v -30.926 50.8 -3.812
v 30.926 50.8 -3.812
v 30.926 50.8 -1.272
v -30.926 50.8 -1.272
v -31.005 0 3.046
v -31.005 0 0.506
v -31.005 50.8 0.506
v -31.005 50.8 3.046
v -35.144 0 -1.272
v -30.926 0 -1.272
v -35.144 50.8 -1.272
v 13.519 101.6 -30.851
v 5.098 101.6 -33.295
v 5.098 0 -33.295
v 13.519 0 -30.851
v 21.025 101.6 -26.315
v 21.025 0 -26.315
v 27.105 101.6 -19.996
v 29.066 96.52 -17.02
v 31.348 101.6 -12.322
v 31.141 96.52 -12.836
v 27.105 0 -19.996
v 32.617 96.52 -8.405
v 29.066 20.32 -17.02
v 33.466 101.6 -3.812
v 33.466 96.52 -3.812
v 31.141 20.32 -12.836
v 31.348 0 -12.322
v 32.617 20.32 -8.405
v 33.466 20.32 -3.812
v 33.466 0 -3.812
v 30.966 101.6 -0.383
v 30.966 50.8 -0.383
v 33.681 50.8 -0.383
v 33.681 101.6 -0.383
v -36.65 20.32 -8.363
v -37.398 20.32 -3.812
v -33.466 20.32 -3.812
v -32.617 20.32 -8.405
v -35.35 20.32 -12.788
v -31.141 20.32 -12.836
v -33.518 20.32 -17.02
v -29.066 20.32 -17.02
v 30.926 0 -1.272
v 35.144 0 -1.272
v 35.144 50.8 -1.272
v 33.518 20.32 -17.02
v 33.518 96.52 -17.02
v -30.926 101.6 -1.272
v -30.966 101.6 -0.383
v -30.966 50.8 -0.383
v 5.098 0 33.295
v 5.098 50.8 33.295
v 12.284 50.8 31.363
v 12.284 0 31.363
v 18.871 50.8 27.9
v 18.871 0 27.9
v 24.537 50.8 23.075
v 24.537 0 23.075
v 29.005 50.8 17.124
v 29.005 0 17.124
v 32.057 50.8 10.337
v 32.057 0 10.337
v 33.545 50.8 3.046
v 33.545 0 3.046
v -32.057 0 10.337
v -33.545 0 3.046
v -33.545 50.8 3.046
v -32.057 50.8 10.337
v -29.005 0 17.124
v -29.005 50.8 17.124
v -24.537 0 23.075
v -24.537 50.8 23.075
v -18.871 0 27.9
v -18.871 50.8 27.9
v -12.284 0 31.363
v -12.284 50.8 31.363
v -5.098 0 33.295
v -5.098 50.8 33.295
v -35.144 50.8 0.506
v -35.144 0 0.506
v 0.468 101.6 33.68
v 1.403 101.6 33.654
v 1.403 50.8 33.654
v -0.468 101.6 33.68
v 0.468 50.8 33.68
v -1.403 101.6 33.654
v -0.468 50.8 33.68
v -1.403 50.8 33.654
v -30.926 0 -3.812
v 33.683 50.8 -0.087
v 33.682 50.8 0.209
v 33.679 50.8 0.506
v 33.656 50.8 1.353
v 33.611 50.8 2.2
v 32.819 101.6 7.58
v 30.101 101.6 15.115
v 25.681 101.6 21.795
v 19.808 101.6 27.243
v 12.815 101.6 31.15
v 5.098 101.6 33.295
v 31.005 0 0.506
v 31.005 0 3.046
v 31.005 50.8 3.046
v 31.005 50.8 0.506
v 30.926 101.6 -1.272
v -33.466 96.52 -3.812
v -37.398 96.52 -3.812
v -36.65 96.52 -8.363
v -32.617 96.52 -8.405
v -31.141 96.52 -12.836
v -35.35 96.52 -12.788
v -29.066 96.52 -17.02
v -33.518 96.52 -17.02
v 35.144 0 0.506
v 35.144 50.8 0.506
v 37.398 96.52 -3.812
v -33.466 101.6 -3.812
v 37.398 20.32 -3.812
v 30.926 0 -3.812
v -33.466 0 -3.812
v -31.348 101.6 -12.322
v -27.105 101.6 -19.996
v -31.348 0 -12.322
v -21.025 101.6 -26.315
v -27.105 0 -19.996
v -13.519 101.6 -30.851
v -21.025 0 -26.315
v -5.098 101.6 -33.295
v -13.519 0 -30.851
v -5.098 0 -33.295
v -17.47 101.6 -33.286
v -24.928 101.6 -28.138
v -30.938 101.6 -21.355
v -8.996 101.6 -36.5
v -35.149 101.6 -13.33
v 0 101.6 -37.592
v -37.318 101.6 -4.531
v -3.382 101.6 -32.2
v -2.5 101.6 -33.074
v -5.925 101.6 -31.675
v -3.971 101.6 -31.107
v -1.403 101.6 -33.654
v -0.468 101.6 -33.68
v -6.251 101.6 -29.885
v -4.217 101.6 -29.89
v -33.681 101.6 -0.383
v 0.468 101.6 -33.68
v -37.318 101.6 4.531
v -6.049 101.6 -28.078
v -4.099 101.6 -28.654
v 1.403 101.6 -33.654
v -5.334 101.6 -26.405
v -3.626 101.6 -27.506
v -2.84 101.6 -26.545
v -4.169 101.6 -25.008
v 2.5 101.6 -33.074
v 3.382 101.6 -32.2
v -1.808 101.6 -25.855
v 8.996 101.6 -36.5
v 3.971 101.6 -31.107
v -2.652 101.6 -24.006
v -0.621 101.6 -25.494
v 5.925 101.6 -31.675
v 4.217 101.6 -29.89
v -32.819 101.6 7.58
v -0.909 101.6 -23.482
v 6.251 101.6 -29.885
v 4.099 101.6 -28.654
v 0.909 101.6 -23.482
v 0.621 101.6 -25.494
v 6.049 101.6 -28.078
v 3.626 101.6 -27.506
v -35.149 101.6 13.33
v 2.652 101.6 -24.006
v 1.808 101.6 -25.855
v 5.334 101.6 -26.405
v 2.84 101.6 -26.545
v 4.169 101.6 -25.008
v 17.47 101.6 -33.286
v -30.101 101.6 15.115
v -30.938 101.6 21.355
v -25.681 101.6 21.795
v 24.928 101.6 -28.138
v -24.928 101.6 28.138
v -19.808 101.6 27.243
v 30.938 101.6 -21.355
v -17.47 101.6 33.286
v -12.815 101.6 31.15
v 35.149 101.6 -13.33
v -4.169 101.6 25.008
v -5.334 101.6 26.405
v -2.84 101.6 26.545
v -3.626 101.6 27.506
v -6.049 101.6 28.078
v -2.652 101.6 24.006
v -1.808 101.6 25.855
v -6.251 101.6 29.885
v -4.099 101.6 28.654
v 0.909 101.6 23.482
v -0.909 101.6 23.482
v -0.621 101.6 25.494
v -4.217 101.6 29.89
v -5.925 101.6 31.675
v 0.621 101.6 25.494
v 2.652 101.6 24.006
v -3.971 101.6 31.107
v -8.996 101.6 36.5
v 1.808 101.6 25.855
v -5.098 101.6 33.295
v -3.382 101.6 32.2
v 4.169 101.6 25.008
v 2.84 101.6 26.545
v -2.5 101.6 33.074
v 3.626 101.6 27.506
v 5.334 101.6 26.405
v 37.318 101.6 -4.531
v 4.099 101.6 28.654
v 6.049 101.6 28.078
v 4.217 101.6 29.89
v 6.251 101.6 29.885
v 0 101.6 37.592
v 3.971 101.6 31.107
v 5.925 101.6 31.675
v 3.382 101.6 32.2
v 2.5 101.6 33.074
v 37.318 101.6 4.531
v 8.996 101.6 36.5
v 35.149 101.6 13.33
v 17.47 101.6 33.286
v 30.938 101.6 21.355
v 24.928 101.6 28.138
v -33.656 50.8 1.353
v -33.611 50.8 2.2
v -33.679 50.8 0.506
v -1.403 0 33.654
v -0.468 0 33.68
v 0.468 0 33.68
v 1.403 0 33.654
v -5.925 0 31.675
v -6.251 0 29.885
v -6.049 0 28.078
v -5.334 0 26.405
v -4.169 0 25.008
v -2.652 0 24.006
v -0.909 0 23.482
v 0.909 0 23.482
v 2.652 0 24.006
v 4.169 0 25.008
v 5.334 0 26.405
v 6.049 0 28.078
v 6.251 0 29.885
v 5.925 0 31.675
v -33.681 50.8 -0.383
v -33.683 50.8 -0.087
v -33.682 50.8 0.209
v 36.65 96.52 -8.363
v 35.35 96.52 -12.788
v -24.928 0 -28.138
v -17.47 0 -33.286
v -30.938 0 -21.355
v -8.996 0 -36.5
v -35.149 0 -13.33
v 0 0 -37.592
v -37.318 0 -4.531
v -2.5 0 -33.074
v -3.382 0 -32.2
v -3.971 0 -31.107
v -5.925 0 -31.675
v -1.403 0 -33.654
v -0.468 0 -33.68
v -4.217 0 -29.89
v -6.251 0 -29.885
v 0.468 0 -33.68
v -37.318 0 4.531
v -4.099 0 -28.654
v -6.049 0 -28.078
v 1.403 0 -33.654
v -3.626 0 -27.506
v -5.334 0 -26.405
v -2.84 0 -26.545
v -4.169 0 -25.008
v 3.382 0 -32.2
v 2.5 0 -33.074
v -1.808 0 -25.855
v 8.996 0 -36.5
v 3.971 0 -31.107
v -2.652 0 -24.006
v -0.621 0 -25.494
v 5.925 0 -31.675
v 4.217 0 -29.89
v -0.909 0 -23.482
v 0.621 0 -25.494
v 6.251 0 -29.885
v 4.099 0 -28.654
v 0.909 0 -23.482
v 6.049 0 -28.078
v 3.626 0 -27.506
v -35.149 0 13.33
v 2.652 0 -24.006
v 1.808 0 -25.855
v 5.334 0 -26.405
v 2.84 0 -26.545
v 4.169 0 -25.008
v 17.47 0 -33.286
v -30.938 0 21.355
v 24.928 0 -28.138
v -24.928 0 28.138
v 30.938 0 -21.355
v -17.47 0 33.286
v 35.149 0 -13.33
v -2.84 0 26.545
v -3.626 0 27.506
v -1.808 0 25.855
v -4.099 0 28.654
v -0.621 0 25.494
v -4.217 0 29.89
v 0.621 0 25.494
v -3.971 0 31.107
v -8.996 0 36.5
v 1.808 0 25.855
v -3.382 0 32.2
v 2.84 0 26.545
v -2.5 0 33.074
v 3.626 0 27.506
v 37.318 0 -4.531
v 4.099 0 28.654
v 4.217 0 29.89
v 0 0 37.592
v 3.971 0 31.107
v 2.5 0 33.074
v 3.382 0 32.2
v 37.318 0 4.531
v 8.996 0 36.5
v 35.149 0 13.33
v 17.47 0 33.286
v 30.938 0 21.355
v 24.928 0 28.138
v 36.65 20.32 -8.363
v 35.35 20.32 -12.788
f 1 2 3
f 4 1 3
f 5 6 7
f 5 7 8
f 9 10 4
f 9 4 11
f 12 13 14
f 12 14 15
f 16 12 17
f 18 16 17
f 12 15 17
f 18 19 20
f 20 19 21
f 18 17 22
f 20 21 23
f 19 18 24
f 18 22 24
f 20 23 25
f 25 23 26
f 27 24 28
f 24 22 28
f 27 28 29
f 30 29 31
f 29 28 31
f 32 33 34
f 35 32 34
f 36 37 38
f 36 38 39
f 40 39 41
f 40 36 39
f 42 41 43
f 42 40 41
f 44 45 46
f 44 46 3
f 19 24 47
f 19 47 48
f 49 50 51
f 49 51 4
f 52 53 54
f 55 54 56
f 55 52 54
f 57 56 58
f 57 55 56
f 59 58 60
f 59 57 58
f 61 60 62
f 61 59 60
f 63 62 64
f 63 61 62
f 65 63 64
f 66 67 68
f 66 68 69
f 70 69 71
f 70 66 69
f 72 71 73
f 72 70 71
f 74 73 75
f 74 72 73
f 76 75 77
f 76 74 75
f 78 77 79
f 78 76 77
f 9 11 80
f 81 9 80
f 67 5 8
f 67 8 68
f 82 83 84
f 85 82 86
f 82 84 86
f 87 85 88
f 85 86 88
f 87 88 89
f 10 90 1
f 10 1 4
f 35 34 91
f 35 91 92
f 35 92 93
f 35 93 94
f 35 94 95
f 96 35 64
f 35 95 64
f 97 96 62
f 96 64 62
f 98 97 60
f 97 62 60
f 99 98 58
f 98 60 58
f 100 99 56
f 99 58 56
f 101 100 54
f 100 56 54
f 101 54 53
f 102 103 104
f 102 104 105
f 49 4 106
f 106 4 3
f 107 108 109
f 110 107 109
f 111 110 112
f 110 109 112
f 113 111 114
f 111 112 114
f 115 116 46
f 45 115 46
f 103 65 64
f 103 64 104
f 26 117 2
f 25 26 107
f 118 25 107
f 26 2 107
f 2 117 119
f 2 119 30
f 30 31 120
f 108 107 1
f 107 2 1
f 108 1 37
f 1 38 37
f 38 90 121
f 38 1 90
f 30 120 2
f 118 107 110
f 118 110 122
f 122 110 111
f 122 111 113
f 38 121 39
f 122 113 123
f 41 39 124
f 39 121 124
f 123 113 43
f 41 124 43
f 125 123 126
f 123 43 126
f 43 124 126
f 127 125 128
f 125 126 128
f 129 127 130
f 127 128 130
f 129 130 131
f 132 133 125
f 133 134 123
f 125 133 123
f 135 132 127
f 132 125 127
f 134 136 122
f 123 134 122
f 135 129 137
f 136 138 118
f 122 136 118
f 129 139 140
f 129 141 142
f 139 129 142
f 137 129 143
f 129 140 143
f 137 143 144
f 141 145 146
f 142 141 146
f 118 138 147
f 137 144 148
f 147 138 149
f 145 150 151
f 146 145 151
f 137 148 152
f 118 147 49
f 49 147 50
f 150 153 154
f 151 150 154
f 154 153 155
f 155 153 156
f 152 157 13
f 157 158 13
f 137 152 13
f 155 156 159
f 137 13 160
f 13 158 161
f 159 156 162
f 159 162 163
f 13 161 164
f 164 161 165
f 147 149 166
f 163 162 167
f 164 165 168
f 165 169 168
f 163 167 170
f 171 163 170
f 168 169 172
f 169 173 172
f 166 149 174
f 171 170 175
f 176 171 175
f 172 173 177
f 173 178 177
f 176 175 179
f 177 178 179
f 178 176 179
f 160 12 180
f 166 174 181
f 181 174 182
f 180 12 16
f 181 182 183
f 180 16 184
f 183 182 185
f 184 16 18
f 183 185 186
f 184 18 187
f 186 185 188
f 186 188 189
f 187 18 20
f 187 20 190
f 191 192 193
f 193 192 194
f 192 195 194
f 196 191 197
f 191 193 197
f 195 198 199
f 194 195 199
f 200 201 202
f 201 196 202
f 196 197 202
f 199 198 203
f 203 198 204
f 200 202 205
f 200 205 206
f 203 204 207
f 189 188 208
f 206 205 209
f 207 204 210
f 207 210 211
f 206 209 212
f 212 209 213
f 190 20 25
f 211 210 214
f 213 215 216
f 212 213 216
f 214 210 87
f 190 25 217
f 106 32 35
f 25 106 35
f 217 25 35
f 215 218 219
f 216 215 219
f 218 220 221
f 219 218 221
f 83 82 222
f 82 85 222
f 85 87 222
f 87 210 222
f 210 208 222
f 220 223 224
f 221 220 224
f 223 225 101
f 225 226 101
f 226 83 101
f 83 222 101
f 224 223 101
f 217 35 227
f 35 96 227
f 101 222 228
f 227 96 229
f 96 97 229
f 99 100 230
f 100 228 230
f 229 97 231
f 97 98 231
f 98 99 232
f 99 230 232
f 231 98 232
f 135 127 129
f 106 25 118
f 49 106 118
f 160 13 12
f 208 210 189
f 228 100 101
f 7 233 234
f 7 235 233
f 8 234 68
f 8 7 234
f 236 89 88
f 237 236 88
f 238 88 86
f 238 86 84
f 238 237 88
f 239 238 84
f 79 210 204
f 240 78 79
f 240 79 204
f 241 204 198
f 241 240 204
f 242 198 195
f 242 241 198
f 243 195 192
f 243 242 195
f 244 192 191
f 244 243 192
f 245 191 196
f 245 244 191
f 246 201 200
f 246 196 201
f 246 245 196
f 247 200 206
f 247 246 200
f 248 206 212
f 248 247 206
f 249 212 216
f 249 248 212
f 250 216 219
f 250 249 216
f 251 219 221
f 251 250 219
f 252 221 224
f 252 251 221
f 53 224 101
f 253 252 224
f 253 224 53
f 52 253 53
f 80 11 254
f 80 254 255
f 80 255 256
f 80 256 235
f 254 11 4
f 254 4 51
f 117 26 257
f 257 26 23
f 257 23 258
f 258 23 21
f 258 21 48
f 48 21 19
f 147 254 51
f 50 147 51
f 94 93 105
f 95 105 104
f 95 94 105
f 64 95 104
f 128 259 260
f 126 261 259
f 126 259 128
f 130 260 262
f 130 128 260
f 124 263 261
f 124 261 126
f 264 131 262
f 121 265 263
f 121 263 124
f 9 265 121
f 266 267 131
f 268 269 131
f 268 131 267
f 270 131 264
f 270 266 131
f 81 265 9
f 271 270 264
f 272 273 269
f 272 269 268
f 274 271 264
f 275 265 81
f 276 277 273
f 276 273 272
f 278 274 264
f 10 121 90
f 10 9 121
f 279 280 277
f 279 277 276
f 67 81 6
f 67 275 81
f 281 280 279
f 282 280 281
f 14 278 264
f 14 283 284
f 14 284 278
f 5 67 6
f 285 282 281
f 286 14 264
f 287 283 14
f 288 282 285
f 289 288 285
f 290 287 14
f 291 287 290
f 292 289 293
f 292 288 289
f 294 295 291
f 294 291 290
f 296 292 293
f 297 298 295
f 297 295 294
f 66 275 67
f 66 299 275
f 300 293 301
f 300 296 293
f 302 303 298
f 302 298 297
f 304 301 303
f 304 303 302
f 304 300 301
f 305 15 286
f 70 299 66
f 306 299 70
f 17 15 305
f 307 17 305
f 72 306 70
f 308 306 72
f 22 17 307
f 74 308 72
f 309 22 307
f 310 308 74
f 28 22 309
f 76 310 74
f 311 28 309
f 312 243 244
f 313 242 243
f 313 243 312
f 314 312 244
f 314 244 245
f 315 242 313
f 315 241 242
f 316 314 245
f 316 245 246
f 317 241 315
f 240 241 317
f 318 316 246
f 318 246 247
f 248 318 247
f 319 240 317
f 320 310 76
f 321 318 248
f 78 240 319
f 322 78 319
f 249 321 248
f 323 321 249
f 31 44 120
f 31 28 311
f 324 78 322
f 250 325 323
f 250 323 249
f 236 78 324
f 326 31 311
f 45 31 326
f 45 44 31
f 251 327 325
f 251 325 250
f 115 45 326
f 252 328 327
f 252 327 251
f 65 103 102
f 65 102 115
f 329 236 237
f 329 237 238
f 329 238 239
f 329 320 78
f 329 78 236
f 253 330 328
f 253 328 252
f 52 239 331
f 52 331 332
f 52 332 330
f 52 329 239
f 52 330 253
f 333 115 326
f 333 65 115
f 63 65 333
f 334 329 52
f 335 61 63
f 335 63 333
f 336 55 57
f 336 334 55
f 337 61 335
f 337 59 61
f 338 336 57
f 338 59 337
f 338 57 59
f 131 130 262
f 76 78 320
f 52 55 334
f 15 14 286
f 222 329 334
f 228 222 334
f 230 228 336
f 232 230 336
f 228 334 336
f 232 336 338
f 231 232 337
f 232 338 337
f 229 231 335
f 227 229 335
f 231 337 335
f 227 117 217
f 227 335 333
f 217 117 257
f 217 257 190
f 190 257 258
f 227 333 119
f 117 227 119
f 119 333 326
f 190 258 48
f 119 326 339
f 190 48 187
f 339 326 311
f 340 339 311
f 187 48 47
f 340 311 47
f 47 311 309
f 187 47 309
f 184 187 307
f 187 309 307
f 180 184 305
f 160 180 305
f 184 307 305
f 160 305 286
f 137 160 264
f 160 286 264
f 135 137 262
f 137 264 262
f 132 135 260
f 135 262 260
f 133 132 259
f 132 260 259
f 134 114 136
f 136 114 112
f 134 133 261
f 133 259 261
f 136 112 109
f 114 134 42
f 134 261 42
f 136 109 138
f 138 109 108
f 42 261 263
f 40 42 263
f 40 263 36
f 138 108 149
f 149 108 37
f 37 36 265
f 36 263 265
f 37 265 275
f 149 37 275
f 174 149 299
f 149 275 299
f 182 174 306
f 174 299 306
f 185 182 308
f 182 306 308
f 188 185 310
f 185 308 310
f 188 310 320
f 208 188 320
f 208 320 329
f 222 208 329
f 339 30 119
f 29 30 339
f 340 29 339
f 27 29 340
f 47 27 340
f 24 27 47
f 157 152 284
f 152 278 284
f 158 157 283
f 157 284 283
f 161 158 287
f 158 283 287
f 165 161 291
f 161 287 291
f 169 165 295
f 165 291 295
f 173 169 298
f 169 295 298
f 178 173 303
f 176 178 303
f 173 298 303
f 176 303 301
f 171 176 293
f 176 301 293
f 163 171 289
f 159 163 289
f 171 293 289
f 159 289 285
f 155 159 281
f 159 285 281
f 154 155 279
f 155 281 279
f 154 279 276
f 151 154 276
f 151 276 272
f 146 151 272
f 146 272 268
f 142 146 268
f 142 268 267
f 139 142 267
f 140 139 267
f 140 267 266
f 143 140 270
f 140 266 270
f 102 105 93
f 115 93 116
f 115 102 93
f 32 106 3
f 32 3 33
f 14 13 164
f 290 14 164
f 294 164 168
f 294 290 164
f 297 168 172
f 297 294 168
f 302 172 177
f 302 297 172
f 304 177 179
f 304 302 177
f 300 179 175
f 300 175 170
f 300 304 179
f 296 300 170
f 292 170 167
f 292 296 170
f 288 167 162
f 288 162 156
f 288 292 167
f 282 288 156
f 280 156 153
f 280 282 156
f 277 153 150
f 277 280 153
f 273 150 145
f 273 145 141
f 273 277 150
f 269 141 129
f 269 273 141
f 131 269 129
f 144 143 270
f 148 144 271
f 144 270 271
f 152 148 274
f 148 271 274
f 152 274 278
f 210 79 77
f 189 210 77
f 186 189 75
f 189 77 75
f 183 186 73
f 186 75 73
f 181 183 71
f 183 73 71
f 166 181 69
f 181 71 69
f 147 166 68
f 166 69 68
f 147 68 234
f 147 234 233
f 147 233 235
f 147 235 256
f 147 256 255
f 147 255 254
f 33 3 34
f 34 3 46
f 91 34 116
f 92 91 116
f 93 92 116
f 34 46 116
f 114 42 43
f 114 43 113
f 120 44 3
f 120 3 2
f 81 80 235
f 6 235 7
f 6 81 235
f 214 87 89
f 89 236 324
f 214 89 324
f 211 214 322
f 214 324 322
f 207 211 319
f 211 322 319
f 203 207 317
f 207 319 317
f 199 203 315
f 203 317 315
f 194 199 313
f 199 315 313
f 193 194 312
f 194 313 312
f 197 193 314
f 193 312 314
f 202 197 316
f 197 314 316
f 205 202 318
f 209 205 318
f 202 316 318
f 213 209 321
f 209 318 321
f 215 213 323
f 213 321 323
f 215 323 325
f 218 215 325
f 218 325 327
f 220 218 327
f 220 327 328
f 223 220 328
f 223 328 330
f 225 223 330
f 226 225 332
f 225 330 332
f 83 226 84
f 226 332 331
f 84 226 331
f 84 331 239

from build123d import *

# Parameters (mm, degrees)
SKETCH1_R               = 37.592
BOSS_EXTRUDE1_DEPTH     = 50.8
SKETCH4_R               = 37.592
BOSS_EXTRUDE2_DEPTH     = 50.8
SKETCH5_R               = 6.25475
SKETCH5_R_2             = 4.22275
BOSS_EXTRUDE3_DEPTH     = 101.6
CUT_EXTRUDE1_DEPTH      = 60.198
CUT_EXTRUDE1_DEPTH_BACK = 64.516
SKETCH6_W               = 13.208
SKETCH6_H               = 76.2


with BuildPart() as part:
    # Sketch1 → Boss-Extrude1 (new body)
    with BuildSketch(Plane(origin=(0, 0, 0), x_dir=(1, 0, 0), z_dir=(0, 1, 0))):
        with Locations(Location((0, 0, 0), (0, 0, 270))):
            Circle(SKETCH1_R)
        with BuildLine():
            Line((-35.143970714, 1.272475327), (-35.143970714, -0.505524673))
            Line((-35.143970714, -0.505524673), (-31.004836055, -0.505524673))
            Line((-31.004836055, -0.505524673), (-31.004836055, -3.045524673))
            Line((-31.004836055, -3.045524673), (-33.544836055, -3.045524673))
            ThreePointArc((-33.544836055, -3.045524673), (0, -33.682803423), (33.544836055, -3.045524673))
            Line((33.544836055, -3.045524673), (31.004836055, -3.045524673))
            Line((31.004836055, -3.045524673), (31.004836055, -0.505524673))
            Line((31.004836055, -0.505524673), (35.143970714, -0.505524673))
            Line((35.143970714, -0.505524673), (35.143970714, 1.272475327))
            Line((35.143970714, 1.272475327), (30.926345458, 1.272475327))
            Line((30.926345458, 1.272475327), (30.926345458, 3.812475327))
            Line((30.926345458, 3.812475327), (33.466345458, 3.812475327))
            ThreePointArc((33.466345458, 3.812475327), (0, 33.682803423), (-33.466345458, 3.812475327))
            Line((-33.466345458, 3.812475327), (-30.926345458, 3.812475327))
            Line((-30.926345458, 3.812475327), (-30.926345458, 1.272475327))
            Line((-30.926345458, 1.272475327), (-35.143970714, 1.272475327))
        make_face(mode=Mode.SUBTRACT)
    extrude(amount=BOSS_EXTRUDE1_DEPTH)

    # Sketch4 → Boss-Extrude2 (add)
    with BuildSketch(Plane(origin=(0, 50.8, 0), x_dir=(1, 0, 0), z_dir=(0, 1, 0))):
        with Locations(Location((0, 0, 0), (0, 0, 270))):
            Circle(SKETCH4_R)
        with BuildLine():
            Line((33.466345458, 3.812475327), (-33.466345458, 3.812475327))
            ThreePointArc((-33.466345458, 3.812475327), (0, 33.682803423), (33.466345458, 3.812475327))
        make_face(mode=Mode.SUBTRACT)
        with BuildLine():
            Line((-30.926345458, 1.272475327), (30.926345458, 1.272475327))
            Line((30.926345458, 1.272475327), (30.965590757, 0.383475327))
            Line((30.965590757, 0.383475327), (33.680620439, 0.383475327))
            ThreePointArc((33.680620439, 0.383475327), (0, -33.682803423), (-33.680620439, 0.383475327))
            Line((-33.680620439, 0.383475327), (-30.965590757, 0.383475327))
            Line((-30.965590757, 0.383475327), (-30.926345458, 1.272475327))
        make_face(mode=Mode.SUBTRACT)
    extrude(amount=BOSS_EXTRUDE2_DEPTH)

    # Sketch5 → Boss-Extrude3 (add)
    # profile 1 of 2: a face of its own
    with BuildSketch(Plane.XZ):
        with Locations((0, -29.670562634)):
            Circle(SKETCH5_R)
        with Locations((0, -29.670562634)):
            Circle(SKETCH5_R_2, mode=Mode.SUBTRACT)
    # profile 2 of 2: a face of its own
    with BuildSketch(Plane.XZ):
        with Locations((0, 29.670562634)):
            Circle(SKETCH5_R)
        with Locations((0, 29.670562634)):
            Circle(SKETCH5_R_2, mode=Mode.SUBTRACT)
    extrude(amount=-BOSS_EXTRUDE3_DEPTH)

    # Sketch6 → Cut-Extrude1 (cut, two sides: drawn at the far end of the back side and taken through both)
    with BuildSketch(Plane(origin=(0, 0, 0), x_dir=(0, 0, -1), z_dir=(1, 0, 0)).offset(-CUT_EXTRUDE1_DEPTH_BACK)):
        with Locations((10.416475327, 58.42)):
            Rectangle(SKETCH6_W, SKETCH6_H)
    extrude(amount=CUT_EXTRUDE1_DEPTH + CUT_EXTRUDE1_DEPTH_BACK, mode=Mode.SUBTRACT)


solid = part.part
